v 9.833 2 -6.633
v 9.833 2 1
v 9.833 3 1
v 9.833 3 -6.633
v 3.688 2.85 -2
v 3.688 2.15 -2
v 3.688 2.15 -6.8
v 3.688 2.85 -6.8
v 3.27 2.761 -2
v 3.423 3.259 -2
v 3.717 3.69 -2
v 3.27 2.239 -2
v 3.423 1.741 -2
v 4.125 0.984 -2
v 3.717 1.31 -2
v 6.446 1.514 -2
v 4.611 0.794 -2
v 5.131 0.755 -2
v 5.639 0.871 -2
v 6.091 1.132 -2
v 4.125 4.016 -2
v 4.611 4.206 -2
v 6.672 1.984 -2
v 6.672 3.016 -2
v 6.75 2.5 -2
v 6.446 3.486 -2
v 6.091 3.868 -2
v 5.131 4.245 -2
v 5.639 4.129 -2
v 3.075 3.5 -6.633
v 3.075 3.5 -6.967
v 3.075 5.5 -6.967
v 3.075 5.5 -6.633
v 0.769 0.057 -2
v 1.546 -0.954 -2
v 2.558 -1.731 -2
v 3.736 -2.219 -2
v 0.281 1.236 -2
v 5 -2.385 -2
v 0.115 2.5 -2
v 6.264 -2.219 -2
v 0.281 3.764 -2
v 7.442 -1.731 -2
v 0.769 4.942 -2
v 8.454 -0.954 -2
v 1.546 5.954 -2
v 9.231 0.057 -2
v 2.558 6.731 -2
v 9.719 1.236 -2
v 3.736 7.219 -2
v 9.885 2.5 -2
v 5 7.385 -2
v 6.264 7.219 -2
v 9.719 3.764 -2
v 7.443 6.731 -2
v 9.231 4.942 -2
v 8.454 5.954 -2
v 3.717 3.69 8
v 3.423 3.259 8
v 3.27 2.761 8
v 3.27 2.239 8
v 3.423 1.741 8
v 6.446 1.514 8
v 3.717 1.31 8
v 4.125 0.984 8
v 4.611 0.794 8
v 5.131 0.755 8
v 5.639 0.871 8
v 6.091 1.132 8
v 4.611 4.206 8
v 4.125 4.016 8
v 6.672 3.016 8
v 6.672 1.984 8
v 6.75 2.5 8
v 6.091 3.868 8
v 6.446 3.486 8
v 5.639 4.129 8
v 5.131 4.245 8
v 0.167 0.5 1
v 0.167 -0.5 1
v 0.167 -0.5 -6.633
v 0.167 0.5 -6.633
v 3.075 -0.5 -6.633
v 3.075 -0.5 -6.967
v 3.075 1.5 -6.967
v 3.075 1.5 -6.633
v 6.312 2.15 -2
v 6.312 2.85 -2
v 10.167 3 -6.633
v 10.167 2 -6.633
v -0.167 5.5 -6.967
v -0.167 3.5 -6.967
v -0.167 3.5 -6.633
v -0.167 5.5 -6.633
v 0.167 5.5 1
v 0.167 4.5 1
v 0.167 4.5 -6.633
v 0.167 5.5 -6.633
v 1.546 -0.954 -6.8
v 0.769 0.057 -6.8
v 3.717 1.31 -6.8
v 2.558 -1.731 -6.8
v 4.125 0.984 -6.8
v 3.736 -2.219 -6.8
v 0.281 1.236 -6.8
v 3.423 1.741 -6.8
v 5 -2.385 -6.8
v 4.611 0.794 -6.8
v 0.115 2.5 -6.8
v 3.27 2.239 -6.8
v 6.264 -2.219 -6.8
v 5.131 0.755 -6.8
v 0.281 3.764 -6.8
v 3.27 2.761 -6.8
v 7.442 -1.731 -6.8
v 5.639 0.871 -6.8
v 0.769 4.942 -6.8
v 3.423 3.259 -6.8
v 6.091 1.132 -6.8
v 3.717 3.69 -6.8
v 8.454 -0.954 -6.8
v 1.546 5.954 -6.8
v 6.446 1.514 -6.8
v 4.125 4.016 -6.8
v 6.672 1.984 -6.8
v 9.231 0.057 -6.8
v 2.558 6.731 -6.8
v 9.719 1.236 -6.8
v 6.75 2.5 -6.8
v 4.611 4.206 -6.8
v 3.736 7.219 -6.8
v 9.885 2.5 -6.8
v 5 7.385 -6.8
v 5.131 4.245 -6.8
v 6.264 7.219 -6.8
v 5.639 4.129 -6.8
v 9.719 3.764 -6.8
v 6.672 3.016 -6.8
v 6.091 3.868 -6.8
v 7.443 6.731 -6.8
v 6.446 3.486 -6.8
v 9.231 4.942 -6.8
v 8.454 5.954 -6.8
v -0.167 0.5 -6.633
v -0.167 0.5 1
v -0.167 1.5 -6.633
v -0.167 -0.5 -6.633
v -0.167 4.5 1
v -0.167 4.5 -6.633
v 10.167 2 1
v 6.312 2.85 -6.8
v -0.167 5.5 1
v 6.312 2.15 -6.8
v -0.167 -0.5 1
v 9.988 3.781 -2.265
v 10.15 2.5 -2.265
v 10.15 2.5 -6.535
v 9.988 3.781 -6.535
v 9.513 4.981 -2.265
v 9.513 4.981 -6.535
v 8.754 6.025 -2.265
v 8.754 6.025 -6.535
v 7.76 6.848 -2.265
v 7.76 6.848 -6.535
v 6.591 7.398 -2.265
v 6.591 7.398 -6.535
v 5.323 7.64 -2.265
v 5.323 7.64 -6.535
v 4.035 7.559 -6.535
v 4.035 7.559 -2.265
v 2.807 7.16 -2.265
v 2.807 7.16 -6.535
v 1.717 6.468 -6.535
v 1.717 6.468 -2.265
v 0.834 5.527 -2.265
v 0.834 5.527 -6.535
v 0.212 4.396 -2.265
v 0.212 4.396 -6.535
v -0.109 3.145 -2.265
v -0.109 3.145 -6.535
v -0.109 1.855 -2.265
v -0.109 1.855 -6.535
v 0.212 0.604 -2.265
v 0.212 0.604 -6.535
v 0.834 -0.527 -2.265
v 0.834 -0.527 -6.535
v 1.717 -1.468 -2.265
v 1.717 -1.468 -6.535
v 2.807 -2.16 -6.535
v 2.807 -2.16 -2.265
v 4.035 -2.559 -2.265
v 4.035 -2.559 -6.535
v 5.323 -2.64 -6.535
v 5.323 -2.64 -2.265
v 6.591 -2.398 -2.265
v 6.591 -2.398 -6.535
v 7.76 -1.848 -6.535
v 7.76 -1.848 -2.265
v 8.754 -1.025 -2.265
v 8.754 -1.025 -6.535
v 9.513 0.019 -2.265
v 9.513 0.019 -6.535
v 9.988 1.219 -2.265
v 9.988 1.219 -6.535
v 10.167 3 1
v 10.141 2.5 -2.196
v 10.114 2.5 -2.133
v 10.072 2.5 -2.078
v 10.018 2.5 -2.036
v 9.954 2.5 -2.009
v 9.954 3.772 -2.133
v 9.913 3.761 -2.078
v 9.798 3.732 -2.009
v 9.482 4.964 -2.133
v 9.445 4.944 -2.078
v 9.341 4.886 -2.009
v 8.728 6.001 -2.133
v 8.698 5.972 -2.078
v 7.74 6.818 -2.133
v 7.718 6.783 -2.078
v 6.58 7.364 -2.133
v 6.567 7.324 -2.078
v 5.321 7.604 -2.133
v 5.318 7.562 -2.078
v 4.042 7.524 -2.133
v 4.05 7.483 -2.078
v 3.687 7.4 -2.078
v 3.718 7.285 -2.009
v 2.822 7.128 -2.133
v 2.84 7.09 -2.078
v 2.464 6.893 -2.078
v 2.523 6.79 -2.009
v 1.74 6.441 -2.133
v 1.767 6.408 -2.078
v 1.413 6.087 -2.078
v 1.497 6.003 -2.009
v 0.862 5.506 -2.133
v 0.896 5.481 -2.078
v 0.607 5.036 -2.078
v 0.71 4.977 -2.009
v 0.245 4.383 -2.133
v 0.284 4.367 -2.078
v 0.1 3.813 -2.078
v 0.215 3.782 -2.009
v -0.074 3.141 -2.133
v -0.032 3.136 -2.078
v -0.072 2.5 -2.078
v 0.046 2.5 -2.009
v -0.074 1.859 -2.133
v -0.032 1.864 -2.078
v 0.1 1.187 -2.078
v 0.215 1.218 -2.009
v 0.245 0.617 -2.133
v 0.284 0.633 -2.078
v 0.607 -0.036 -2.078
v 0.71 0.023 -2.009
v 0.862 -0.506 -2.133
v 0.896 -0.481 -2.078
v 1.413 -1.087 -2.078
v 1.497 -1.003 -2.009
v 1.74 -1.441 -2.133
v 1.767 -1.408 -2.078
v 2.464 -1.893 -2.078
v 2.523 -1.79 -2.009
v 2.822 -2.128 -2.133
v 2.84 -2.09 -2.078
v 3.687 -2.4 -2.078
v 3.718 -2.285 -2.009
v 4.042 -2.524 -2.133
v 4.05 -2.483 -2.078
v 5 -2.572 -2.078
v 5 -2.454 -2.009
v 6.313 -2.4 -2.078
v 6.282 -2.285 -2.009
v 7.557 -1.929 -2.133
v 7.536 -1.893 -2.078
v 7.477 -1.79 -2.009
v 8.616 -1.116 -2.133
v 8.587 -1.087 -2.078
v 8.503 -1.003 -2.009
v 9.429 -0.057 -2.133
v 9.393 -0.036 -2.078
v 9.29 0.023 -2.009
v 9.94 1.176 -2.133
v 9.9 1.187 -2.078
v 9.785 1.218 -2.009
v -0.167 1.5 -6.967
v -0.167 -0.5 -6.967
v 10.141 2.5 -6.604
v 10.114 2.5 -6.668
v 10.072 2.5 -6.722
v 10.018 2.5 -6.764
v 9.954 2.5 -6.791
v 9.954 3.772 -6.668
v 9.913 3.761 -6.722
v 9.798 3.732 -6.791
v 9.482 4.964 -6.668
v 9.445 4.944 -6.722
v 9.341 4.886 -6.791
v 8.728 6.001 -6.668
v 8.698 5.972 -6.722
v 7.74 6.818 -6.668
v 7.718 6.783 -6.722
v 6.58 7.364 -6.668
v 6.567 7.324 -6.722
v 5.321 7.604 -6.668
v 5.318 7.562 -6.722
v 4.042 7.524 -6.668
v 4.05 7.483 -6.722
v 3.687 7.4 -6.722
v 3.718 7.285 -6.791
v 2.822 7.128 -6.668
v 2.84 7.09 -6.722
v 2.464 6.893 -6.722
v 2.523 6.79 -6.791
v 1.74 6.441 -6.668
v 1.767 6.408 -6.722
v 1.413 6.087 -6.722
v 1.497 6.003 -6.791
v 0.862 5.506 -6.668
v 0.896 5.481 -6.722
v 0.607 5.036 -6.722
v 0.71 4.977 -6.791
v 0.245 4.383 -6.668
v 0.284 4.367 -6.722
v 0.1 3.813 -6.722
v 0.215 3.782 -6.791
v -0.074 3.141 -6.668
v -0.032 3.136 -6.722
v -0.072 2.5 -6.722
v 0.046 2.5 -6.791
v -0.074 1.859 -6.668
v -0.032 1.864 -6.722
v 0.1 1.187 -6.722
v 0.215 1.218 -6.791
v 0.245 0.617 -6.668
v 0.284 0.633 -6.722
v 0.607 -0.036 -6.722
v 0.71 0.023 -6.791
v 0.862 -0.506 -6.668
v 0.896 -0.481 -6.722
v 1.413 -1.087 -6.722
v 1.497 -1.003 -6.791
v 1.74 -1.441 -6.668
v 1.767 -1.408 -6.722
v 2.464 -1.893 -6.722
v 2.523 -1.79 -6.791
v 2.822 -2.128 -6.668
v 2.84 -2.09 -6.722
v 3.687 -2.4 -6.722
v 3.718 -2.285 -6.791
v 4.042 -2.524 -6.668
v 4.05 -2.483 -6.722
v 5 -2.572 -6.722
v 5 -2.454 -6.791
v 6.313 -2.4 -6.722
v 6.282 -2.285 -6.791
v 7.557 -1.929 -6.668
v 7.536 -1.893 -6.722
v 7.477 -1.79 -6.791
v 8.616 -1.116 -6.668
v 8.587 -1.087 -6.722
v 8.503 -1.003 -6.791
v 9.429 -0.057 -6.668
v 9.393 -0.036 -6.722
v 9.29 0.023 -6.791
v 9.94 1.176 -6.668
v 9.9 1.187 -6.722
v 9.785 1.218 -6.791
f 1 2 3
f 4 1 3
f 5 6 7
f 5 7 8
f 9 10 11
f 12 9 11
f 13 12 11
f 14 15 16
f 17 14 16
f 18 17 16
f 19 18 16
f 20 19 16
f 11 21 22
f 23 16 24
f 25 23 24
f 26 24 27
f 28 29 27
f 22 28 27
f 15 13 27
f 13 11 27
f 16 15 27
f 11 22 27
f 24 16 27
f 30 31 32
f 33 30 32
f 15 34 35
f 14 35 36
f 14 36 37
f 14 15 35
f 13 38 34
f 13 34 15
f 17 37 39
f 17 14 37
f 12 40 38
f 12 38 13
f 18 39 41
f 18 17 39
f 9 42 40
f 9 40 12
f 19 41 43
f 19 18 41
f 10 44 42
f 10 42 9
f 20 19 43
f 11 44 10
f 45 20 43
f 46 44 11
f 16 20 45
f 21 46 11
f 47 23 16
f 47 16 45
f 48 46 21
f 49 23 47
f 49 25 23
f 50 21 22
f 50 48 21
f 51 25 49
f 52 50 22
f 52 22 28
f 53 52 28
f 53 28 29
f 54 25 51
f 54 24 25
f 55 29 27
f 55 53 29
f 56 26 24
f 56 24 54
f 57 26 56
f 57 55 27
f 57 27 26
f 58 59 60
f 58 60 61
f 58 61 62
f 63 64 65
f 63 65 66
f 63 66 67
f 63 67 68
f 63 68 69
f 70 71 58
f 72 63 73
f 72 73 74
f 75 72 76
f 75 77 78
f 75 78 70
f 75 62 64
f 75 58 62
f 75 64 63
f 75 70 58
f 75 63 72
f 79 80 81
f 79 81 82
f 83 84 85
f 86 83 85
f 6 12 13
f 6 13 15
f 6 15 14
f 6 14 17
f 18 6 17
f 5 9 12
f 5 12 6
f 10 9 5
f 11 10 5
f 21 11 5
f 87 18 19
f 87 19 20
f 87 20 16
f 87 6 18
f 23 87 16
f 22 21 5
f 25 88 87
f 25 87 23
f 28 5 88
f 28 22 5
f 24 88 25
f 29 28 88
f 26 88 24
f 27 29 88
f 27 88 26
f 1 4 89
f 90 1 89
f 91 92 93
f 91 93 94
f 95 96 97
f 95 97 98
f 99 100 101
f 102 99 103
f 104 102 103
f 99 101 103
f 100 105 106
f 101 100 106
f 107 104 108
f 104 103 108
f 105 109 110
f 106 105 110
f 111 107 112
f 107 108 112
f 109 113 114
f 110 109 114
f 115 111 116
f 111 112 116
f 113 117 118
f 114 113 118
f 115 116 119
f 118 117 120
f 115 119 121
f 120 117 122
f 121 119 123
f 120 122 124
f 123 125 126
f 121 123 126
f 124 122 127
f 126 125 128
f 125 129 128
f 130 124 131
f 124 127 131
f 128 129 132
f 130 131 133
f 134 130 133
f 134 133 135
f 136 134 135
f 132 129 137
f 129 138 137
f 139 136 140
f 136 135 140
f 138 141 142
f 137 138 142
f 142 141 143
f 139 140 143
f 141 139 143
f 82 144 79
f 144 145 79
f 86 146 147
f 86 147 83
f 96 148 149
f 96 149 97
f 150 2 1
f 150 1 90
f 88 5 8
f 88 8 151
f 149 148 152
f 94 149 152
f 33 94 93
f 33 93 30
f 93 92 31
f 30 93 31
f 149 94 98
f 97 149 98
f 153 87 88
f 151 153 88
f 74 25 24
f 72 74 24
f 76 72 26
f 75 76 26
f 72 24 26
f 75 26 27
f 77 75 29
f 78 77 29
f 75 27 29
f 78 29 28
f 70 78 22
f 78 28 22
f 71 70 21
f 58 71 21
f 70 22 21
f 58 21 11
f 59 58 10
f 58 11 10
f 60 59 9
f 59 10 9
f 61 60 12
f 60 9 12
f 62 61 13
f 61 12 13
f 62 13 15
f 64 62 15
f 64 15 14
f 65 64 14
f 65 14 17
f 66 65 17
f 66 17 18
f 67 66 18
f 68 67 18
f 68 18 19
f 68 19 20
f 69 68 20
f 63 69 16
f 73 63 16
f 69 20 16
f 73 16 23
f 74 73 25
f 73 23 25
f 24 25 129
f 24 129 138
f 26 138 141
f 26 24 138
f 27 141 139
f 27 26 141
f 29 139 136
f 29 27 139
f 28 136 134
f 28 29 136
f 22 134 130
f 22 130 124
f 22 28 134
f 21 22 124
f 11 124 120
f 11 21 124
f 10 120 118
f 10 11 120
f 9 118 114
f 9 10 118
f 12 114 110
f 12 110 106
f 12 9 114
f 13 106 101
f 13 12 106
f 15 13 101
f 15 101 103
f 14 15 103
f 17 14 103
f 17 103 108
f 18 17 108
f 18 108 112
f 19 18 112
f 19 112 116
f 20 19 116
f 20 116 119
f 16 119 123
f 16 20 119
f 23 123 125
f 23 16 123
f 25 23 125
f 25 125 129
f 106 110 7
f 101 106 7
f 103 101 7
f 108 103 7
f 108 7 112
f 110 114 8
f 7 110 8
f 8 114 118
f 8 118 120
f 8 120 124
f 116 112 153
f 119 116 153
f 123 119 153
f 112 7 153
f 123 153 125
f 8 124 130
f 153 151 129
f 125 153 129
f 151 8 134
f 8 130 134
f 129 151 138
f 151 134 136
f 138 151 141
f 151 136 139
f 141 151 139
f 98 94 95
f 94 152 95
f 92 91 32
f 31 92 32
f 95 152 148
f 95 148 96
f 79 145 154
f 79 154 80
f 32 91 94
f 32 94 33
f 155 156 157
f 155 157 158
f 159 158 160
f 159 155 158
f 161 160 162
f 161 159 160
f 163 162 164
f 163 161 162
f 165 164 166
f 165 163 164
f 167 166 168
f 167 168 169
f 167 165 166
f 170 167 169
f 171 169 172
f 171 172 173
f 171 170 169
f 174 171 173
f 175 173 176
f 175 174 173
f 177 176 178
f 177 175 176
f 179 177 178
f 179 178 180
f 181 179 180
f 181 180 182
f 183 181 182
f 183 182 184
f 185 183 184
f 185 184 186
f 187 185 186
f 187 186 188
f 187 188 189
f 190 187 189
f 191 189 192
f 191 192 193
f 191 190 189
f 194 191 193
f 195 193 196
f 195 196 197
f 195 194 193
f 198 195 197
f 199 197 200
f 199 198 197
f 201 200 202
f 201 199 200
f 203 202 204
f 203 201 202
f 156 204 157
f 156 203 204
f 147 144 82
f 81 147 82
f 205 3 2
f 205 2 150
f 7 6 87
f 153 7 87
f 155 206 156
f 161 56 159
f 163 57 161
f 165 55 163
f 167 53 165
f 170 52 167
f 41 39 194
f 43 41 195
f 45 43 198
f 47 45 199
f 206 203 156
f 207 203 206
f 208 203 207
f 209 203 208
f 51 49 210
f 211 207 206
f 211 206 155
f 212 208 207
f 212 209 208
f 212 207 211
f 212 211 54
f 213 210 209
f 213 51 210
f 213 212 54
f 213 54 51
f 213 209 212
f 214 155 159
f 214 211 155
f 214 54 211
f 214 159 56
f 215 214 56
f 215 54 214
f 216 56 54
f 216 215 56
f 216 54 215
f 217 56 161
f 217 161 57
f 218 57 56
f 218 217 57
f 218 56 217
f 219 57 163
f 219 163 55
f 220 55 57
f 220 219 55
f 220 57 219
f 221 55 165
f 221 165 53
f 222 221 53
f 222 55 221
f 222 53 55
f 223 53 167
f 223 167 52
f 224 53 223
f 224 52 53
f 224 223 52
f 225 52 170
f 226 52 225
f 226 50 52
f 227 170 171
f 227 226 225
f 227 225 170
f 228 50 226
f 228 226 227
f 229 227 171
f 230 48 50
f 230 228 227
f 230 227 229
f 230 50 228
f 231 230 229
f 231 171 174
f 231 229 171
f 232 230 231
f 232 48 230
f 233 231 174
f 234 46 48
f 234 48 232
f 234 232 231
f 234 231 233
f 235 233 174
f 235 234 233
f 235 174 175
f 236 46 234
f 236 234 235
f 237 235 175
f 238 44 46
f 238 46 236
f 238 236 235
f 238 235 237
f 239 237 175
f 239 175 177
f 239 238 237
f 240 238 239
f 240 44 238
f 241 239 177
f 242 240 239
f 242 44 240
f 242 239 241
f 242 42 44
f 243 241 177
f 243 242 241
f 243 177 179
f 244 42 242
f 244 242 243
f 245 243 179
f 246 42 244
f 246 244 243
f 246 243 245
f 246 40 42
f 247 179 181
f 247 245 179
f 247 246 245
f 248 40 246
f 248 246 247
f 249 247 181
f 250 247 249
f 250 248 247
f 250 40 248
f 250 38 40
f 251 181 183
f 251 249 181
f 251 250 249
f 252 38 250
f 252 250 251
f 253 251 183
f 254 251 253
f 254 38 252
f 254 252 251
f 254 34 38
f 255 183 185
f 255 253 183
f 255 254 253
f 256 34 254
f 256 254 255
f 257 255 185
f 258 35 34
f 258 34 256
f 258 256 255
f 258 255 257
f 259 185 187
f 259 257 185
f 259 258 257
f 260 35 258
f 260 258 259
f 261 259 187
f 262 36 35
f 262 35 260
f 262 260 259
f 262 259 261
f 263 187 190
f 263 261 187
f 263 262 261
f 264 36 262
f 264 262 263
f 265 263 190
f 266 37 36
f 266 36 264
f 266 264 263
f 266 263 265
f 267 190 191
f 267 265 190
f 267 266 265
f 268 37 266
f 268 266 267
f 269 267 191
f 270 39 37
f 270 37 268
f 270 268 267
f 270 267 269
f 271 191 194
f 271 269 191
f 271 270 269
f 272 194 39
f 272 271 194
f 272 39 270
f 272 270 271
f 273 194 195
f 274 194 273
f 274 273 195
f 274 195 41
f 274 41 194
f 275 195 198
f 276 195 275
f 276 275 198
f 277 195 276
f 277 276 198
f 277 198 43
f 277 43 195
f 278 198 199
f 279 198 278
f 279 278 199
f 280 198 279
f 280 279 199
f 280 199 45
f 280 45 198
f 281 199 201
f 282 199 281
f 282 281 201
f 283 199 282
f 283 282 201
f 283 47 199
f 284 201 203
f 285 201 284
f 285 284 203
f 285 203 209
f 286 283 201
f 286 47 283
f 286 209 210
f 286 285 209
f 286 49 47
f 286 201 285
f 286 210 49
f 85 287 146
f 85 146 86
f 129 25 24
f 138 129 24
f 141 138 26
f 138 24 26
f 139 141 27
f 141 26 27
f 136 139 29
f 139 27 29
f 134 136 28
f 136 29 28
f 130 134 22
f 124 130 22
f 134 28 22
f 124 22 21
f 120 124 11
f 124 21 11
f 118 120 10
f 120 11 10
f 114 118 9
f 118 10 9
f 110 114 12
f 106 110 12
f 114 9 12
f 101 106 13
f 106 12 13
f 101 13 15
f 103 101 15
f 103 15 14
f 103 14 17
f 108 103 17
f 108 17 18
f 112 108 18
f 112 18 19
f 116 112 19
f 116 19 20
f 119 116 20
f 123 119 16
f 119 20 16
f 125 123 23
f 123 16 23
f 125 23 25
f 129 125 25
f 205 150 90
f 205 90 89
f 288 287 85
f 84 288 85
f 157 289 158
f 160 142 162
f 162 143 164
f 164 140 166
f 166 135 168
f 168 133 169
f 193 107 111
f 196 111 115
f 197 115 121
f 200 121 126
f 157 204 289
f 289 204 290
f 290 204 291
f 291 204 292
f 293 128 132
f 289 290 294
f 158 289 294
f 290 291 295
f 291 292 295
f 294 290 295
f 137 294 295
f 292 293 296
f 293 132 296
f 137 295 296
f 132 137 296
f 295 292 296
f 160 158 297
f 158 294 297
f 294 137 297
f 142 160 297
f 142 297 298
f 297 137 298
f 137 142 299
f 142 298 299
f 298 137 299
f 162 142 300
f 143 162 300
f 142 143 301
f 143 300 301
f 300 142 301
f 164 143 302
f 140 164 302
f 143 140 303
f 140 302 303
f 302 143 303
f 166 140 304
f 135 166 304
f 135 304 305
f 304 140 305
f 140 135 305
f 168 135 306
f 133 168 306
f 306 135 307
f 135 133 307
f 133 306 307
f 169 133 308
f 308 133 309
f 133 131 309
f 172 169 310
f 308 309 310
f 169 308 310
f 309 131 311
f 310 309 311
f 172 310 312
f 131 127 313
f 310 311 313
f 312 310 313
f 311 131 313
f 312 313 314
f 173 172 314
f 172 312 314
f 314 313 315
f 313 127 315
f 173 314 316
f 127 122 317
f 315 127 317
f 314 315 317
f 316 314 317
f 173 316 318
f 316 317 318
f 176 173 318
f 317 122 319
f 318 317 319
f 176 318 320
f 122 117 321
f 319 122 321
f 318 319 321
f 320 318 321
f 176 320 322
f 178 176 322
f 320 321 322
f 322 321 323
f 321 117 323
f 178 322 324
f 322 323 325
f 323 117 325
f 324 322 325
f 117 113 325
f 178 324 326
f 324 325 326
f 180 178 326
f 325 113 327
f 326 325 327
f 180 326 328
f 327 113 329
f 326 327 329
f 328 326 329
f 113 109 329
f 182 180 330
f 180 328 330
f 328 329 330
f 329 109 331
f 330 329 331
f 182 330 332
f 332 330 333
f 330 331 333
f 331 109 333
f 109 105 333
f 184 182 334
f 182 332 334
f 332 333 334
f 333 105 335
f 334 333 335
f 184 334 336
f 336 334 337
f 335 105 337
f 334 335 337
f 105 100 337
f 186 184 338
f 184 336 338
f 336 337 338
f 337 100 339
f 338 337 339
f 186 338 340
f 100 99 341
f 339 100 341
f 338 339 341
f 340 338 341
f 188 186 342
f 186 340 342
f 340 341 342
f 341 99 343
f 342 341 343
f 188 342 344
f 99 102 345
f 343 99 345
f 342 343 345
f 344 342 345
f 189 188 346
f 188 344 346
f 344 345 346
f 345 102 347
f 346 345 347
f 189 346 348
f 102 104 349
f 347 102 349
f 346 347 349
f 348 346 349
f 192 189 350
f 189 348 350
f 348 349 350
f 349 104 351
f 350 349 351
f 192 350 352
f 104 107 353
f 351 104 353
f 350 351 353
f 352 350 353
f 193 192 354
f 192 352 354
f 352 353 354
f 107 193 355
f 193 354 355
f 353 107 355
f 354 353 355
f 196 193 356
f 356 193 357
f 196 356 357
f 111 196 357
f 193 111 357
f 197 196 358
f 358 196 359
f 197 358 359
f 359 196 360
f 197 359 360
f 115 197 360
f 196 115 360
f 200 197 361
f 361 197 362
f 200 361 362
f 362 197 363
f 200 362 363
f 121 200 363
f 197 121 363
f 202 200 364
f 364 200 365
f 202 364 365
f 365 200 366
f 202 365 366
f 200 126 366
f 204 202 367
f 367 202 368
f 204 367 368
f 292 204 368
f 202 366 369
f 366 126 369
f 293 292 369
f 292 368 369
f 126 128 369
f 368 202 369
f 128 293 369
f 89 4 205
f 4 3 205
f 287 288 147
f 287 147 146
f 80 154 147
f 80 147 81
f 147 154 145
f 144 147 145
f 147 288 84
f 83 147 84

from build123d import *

# Parameters (mm, degrees)
SKETCH003_W       = 0.333334
SKETCH003_H       = 1
PAD002_DEPTH      = 1
PAD002_DEPTH_BACK = 6.633333
SKETCH004_R       = 1.75
SKETCH004_W       = 2.625
SKETCH004_H       = 0.7
PAD003_DEPTH      = 4.8
SKETCH_R          = 5.15
SKETCH_R_2        = 1.75
PAD_DEPTH         = 4.8
FILLET_R          = 0.265
SKETCH005_W       = 3.241667
SKETCH005_H       = 2
PAD004_DEPTH      = 0.333333
SKETCH006_R       = 1.75
PAD005_DEPTH      = 10


with BuildPart() as pad002:
    # Sketch003 → Pad002 (new body, two sides)
    with BuildSketch(Plane(origin=(0, 5, 0), x_dir=(1, 0, 0), z_dir=(0, 0, 1))) as pad002_sk:
        Rectangle(SKETCH003_W, SKETCH003_H)
        with Locations((10, -2.5)):
            Rectangle(SKETCH003_W, SKETCH003_H)
        with Locations((0, -5)):
            Rectangle(SKETCH003_W, SKETCH003_H)
    extrude(amount=PAD002_DEPTH)
    extrude(pad002_sk.sketch, amount=-PAD002_DEPTH_BACK)


with BuildPart() as pad003:
    # Sketch004 → Pad003 (new body)
    with BuildSketch(Plane(origin=(0, 5, -2), x_dir=(1, 0, 0), z_dir=(0, 0, 1))):
        with Locations((5, -2.5)):
            Circle(SKETCH004_R)
        with Locations((5, -2.5)):
            Rectangle(SKETCH004_W, SKETCH004_H, mode=Mode.SUBTRACT)
    extrude(amount=-PAD003_DEPTH)


with BuildPart() as fillet_body:
    # Sketch → Pad (new body)
    with BuildSketch(Plane(origin=(0, 5, -2), x_dir=(1, 0, 0), z_dir=(0, 0, 1))):
        with Locations((5, -2.5)):
            Circle(SKETCH_R)
        with Locations((5, -2.5)):
            Circle(SKETCH_R_2, mode=Mode.SUBTRACT)
    extrude(amount=-PAD_DEPTH)

    # Fillet
    fillet_edges = [fillet_body.edges().sort_by_distance(p)[0] for p in [
        (-0.15, 2.5, -2),
        (-0.15, 2.5, -6.8),
    ]]
    fillet(fillet_edges, radius=FILLET_R)


with BuildPart() as pad004:
    # Sketch005 → Pad004 (new body)
    with BuildSketch(Plane(origin=(0, 5, -6.966667), x_dir=(1, 0, 0), z_dir=(0, 0, 1))):
        with Locations((1.454166, -0.5)):
            Rectangle(SKETCH005_W, SKETCH005_H)
        with Locations((1.454166, -4.5)):
            Rectangle(SKETCH005_W, SKETCH005_H)
    extrude(amount=PAD004_DEPTH)


with BuildPart() as pad005:
    # Sketch006 → Pad005 (new body)
    with BuildSketch(Plane(origin=(0, 5, -2), x_dir=(1, 0, 0), z_dir=(0, 0, 1))):
        with Locations((5, -2.5)):
            Circle(SKETCH006_R)
    extrude(amount=PAD005_DEPTH)


solid = Compound([pad002.part, pad003.part, fillet_body.part, pad004.part, pad005.part])
